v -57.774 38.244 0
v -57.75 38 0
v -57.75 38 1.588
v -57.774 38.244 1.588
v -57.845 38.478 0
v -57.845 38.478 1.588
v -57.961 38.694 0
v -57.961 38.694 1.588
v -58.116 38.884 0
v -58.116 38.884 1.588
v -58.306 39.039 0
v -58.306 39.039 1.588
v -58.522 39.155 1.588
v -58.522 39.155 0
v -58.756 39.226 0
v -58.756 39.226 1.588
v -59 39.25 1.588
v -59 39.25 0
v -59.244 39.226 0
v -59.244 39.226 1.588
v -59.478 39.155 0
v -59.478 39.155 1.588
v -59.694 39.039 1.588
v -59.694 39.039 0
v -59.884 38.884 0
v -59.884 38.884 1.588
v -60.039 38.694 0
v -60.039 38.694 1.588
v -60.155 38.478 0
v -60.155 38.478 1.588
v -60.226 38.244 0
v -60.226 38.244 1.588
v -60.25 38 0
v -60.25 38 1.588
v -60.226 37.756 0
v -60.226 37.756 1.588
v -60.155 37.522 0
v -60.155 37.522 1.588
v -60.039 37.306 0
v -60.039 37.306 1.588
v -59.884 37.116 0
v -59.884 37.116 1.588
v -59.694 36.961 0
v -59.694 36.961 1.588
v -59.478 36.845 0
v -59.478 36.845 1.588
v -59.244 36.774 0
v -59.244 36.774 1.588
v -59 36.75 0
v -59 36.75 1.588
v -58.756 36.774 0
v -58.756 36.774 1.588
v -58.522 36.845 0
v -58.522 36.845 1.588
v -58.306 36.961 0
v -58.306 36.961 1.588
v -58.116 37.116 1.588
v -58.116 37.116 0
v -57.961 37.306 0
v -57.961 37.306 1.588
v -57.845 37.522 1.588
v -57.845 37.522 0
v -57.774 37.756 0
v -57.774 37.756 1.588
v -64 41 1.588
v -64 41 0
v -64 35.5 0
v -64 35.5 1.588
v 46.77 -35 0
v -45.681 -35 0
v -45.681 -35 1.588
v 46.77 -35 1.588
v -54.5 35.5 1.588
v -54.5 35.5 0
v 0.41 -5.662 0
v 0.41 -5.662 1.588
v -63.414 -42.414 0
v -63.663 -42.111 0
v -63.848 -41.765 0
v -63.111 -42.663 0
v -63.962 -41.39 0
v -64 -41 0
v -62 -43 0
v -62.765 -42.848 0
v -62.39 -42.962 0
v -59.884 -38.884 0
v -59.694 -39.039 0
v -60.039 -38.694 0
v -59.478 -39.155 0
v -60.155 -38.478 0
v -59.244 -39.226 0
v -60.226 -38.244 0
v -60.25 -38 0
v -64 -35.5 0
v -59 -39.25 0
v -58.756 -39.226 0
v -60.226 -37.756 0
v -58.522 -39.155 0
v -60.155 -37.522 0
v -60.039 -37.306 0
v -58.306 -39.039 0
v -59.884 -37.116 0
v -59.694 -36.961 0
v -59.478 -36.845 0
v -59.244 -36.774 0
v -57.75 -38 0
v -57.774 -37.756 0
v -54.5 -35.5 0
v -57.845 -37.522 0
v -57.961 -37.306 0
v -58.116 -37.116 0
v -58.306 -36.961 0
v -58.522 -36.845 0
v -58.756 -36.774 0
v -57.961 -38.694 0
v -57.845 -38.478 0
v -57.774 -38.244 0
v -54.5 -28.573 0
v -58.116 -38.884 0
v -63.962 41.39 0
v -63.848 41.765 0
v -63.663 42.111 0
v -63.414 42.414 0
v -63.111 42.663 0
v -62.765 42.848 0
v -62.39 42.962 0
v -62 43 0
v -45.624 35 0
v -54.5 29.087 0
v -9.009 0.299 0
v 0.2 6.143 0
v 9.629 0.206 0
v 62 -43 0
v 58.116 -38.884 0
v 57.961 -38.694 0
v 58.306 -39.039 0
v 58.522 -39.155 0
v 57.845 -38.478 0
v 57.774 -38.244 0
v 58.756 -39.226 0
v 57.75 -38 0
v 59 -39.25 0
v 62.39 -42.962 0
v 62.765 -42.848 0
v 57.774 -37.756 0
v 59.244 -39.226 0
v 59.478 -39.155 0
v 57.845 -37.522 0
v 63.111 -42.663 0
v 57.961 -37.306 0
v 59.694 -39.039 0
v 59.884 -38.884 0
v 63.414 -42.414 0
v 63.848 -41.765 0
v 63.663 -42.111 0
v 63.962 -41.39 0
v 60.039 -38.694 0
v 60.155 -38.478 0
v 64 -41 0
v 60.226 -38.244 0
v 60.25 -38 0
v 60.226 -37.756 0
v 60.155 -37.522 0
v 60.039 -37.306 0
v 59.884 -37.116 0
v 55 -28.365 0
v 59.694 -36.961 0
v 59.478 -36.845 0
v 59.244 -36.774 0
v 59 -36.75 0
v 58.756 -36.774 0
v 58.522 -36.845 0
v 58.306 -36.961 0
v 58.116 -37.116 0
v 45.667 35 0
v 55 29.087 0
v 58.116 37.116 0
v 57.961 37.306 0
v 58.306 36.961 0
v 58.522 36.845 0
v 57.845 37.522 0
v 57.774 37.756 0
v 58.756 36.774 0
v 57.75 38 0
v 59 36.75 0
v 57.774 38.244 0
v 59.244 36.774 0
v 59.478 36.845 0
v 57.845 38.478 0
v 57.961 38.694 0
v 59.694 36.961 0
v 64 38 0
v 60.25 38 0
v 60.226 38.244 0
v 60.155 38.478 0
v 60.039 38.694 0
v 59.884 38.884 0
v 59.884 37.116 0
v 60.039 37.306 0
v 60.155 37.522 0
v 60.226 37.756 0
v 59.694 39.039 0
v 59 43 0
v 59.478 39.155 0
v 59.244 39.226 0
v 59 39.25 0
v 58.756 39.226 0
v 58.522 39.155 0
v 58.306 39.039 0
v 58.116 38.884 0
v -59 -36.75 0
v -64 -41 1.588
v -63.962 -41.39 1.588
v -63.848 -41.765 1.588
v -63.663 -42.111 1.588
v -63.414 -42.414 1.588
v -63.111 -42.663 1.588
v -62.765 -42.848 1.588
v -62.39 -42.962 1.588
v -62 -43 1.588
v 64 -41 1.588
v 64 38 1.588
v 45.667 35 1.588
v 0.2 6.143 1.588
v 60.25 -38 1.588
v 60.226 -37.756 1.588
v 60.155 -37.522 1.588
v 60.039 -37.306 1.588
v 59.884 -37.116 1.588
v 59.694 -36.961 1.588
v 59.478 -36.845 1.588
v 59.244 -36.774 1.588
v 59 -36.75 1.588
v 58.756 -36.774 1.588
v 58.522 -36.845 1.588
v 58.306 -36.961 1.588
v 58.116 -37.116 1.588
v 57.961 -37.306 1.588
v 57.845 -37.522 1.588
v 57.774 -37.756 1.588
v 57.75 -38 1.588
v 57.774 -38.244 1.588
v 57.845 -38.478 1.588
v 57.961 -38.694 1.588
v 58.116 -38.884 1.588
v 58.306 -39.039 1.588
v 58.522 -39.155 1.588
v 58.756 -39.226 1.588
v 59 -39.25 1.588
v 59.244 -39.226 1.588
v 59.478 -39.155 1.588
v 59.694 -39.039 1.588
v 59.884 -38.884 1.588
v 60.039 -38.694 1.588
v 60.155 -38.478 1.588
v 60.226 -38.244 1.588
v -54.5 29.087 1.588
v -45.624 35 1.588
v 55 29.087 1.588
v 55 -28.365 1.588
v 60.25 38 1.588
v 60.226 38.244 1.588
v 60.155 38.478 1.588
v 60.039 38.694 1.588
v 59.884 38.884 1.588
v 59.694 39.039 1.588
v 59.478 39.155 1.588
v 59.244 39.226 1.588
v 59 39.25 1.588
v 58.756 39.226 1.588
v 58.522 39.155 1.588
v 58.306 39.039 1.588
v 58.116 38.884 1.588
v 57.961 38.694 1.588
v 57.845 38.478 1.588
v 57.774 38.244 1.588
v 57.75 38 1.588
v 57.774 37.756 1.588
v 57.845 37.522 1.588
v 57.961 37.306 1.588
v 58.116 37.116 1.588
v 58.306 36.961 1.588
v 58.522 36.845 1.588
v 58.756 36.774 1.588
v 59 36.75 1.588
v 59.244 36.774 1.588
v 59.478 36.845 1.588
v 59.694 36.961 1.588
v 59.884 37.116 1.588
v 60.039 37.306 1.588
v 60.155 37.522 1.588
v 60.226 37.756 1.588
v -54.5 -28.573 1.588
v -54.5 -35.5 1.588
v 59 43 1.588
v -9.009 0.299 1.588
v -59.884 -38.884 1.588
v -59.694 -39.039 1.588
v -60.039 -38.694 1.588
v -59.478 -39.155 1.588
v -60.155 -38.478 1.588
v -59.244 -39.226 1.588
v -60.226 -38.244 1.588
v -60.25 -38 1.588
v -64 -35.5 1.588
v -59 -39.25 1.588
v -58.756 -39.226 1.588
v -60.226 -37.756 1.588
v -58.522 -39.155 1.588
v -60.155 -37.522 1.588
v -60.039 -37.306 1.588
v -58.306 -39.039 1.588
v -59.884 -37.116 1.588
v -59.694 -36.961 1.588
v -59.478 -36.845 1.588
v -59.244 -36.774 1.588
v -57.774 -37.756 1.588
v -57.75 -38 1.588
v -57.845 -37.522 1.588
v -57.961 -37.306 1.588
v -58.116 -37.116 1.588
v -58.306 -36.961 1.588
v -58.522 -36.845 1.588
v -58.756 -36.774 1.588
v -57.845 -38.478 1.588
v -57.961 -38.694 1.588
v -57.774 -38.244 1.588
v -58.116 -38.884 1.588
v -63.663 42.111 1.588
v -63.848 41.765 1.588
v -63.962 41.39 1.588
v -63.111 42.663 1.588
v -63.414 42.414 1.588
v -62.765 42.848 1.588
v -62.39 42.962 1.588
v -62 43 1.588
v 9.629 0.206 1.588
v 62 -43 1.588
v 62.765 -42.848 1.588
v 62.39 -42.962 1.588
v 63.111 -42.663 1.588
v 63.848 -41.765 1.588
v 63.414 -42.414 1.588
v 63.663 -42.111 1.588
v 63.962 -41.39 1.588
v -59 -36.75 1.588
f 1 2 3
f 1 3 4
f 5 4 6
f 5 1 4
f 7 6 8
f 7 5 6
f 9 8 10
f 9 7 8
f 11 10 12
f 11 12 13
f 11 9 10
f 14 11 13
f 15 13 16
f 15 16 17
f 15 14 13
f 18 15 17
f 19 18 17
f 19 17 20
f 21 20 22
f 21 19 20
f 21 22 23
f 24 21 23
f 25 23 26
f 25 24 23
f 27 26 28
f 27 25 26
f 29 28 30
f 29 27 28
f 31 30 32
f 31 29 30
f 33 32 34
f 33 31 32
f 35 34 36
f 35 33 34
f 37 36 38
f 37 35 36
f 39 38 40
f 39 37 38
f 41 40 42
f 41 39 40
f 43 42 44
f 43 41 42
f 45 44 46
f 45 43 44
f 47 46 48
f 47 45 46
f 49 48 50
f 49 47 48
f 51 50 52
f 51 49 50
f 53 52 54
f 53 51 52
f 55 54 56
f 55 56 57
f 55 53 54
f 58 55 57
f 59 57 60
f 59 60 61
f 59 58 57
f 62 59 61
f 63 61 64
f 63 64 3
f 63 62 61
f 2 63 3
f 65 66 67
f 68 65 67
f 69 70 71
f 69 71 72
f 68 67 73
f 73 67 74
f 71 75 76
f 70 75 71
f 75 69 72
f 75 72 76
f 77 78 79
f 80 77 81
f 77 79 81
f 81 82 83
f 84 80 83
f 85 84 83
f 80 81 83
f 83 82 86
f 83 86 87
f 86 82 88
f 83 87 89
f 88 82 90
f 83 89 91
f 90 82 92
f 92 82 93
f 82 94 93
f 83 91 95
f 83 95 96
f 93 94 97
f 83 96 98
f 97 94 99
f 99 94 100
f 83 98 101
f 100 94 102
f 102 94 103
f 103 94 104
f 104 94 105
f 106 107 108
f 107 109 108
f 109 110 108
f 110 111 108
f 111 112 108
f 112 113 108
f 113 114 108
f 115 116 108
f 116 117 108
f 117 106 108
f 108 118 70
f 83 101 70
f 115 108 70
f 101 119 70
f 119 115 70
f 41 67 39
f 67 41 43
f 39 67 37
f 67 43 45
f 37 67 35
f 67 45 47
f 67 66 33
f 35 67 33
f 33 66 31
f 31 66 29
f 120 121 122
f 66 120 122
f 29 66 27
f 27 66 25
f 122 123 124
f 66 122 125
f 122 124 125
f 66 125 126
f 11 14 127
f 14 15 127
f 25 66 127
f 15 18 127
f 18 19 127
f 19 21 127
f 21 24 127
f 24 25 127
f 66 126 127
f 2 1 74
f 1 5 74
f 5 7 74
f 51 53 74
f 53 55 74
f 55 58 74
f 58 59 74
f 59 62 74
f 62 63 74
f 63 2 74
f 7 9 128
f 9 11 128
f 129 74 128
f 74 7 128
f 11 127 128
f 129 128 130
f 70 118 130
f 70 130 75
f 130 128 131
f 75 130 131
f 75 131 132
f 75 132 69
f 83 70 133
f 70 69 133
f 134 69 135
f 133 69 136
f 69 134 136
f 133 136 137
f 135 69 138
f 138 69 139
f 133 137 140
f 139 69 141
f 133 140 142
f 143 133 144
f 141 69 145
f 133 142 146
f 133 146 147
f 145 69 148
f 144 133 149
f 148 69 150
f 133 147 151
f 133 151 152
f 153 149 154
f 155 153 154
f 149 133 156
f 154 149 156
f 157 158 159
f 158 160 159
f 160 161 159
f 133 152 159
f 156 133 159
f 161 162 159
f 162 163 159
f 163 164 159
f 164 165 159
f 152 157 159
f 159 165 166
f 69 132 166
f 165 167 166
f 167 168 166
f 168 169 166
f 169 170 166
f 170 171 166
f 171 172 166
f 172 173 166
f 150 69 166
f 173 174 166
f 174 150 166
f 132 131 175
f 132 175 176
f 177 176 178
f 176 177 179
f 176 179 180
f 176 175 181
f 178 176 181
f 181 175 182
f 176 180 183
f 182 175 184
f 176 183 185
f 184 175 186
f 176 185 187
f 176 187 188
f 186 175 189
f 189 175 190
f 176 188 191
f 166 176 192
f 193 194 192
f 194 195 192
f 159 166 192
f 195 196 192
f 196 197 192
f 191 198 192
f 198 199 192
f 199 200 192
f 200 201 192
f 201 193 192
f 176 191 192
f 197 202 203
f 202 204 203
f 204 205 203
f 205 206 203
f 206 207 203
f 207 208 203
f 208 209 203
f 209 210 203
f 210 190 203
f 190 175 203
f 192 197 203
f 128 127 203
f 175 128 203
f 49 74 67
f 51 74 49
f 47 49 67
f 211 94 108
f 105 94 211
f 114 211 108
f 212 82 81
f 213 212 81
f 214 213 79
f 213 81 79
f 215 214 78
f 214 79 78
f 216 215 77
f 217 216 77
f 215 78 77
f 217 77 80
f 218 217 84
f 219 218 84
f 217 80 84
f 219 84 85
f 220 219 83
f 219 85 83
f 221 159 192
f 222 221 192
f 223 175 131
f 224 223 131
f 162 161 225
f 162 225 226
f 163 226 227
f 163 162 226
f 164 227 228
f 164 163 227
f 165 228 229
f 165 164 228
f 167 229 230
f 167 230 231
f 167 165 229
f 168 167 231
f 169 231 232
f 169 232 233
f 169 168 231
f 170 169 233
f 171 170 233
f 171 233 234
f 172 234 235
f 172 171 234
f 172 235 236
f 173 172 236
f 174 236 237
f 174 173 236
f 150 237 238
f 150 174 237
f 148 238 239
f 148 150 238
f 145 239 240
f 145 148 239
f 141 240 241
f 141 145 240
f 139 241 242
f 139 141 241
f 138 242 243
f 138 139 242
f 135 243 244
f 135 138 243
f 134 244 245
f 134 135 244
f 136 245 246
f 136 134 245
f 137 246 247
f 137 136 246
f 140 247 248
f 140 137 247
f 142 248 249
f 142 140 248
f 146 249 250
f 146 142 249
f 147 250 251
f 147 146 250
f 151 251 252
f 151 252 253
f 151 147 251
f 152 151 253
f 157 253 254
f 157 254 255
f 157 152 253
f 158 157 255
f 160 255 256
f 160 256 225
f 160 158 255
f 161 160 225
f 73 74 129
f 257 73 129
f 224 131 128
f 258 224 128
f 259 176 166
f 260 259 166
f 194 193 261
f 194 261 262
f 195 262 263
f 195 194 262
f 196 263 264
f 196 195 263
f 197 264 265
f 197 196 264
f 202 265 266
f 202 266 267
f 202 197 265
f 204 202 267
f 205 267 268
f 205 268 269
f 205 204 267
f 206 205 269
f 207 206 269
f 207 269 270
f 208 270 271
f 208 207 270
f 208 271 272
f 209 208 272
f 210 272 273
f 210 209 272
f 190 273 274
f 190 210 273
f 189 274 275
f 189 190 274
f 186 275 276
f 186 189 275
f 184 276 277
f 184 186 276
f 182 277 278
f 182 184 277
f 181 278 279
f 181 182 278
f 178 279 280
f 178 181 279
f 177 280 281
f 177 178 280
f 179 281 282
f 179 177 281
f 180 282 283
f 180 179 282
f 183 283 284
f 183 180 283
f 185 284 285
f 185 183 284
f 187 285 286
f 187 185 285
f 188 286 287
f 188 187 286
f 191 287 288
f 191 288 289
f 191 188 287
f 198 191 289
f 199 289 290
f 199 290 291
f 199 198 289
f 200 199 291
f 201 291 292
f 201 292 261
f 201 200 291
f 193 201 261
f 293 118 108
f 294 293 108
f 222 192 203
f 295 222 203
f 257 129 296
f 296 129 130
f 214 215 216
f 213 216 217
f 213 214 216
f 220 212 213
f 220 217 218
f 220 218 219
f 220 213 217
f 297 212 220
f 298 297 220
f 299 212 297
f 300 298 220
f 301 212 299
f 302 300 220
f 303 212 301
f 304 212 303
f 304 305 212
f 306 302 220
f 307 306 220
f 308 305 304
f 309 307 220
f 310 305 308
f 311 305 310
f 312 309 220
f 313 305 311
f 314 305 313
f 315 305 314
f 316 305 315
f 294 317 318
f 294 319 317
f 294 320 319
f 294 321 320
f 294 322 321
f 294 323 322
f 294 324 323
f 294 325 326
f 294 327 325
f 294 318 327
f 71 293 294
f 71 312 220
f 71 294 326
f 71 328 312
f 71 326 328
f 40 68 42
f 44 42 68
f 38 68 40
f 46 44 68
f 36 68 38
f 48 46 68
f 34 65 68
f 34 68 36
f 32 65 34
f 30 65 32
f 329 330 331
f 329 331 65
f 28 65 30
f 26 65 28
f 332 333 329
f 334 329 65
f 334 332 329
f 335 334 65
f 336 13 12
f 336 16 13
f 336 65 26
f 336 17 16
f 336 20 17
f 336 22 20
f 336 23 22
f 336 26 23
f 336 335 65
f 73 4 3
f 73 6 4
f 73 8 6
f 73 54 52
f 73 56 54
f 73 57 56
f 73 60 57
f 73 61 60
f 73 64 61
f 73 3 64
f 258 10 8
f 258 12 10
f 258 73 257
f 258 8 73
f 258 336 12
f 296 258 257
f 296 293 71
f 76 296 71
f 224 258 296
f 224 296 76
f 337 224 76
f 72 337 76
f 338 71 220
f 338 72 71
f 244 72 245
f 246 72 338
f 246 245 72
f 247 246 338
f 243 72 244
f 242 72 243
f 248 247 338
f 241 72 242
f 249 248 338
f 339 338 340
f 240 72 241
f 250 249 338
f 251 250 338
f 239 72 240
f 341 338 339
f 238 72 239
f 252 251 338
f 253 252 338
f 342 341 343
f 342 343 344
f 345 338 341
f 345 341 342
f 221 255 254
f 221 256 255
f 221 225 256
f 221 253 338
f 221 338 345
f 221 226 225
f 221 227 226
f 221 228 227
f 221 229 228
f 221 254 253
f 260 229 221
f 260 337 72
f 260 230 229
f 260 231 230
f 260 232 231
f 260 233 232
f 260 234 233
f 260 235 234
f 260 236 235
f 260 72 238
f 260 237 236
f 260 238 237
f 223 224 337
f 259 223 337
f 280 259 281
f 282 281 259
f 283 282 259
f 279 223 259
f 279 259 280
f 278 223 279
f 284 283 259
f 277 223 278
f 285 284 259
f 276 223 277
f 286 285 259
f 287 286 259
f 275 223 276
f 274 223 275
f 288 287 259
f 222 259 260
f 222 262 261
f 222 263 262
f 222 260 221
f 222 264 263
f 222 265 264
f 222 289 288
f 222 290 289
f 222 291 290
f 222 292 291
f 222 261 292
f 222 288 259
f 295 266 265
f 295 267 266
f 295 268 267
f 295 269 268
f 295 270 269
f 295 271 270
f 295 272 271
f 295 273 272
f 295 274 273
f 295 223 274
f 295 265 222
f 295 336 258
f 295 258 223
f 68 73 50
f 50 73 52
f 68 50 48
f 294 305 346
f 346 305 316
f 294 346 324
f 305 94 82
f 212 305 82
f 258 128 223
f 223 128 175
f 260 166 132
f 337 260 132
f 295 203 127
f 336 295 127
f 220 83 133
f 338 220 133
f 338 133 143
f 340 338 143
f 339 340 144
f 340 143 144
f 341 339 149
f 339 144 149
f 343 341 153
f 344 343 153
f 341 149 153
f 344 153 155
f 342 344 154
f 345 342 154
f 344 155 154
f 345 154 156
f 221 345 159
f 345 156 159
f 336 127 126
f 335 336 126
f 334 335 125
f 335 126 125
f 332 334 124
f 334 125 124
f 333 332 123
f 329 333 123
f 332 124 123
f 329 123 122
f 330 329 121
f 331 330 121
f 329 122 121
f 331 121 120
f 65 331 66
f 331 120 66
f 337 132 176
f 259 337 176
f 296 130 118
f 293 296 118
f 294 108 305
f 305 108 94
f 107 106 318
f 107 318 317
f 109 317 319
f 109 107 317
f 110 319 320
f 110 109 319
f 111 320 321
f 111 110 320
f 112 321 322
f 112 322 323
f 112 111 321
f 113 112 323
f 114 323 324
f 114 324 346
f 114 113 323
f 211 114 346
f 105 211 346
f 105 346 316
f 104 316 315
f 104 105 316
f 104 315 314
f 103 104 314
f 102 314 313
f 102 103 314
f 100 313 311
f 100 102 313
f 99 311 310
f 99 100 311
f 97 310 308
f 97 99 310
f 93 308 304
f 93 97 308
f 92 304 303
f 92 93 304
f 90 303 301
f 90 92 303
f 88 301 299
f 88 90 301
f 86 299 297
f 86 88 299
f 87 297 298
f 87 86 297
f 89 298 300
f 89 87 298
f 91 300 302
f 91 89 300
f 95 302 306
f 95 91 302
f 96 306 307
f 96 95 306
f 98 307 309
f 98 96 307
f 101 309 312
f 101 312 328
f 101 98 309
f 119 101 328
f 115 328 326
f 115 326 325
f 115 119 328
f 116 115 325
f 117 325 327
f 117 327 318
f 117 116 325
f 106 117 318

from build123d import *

# Parameters (mm, degrees)
SKETCH2_R           = 1.249995
BOSS_EXTRUDE1_DEPTH = 1.5875


with BuildPart() as part:
    # Sketch2 → Boss-Extrude1 (new body)
    with BuildSketch(Plane.XY):
        with BuildLine():
            Line((64.000000001, -40.999999999), (64.000000001, 37.999999999))
            Line((64.000000001, 37.999999999), (59.000000001, 42.999999999))
            Line((59.000000001, 42.999999999), (-62, 42.999999999))
            ThreePointArc((-62, 42.999999999), (-63.414213563, 42.414213561), (-64.000000001, 40.999999999))
            Line((-64.000000001, 40.999999999), (-64.000000001, 35.5))
            Line((-64.000000001, 35.5), (-54.500000001, 35.5))
            Line((-54.500000001, 35.5), (-54.500000001, 29.086543683))
            Line((-54.500000001, 29.086543683), (-9.009111538, 0.298612306))
            Line((-9.009111538, 0.298612306), (-54.500000001, -28.57300784))
            Line((-54.500000001, -28.57300784), (-54.500000001, -35.5))
            Line((-54.500000001, -35.5), (-64.000000001, -35.5))
            Line((-64.000000001, -35.5), (-64.000000001, -40.999999999))
            ThreePointArc((-64.000000001, -40.999999999), (-63.414213563, -42.414213561), (-62, -42.999999999))
            Line((-62, -42.999999999), (62, -42.999999999))
            ThreePointArc((62, -42.999999999), (63.414213563, -42.414213561), (64.000000001, -40.999999999))
        make_face()
        with Locations((59.000000001, -38)):
            Circle(SKETCH2_R, mode=Mode.SUBTRACT)
        with Locations((-59.000000001, -38)):
            Circle(SKETCH2_R, mode=Mode.SUBTRACT)
        with Locations((59.000000001, 37.999999999)):
            Circle(SKETCH2_R, mode=Mode.SUBTRACT)
        with Locations((-59.000000001, 37.999999999)):
            Circle(SKETCH2_R, mode=Mode.SUBTRACT)
        Polygon((-45.624235778, 34.999999999), (45.667312892, 34.999999999), (0.200195404, 6.143466535), align=None, mode=Mode.SUBTRACT)
        Polygon((-45.681229003, -34.999999999), (46.769999999, -34.999999999), (0.409618796, -5.661828822), align=None, mode=Mode.SUBTRACT)
        Polygon((55.000000001, 29.086543683), (55.000000001, -28.365033721), (9.628517212, 0.206269351), align=None, mode=Mode.SUBTRACT)
    extrude(amount=BOSS_EXTRUDE1_DEPTH)


solid = part.part
